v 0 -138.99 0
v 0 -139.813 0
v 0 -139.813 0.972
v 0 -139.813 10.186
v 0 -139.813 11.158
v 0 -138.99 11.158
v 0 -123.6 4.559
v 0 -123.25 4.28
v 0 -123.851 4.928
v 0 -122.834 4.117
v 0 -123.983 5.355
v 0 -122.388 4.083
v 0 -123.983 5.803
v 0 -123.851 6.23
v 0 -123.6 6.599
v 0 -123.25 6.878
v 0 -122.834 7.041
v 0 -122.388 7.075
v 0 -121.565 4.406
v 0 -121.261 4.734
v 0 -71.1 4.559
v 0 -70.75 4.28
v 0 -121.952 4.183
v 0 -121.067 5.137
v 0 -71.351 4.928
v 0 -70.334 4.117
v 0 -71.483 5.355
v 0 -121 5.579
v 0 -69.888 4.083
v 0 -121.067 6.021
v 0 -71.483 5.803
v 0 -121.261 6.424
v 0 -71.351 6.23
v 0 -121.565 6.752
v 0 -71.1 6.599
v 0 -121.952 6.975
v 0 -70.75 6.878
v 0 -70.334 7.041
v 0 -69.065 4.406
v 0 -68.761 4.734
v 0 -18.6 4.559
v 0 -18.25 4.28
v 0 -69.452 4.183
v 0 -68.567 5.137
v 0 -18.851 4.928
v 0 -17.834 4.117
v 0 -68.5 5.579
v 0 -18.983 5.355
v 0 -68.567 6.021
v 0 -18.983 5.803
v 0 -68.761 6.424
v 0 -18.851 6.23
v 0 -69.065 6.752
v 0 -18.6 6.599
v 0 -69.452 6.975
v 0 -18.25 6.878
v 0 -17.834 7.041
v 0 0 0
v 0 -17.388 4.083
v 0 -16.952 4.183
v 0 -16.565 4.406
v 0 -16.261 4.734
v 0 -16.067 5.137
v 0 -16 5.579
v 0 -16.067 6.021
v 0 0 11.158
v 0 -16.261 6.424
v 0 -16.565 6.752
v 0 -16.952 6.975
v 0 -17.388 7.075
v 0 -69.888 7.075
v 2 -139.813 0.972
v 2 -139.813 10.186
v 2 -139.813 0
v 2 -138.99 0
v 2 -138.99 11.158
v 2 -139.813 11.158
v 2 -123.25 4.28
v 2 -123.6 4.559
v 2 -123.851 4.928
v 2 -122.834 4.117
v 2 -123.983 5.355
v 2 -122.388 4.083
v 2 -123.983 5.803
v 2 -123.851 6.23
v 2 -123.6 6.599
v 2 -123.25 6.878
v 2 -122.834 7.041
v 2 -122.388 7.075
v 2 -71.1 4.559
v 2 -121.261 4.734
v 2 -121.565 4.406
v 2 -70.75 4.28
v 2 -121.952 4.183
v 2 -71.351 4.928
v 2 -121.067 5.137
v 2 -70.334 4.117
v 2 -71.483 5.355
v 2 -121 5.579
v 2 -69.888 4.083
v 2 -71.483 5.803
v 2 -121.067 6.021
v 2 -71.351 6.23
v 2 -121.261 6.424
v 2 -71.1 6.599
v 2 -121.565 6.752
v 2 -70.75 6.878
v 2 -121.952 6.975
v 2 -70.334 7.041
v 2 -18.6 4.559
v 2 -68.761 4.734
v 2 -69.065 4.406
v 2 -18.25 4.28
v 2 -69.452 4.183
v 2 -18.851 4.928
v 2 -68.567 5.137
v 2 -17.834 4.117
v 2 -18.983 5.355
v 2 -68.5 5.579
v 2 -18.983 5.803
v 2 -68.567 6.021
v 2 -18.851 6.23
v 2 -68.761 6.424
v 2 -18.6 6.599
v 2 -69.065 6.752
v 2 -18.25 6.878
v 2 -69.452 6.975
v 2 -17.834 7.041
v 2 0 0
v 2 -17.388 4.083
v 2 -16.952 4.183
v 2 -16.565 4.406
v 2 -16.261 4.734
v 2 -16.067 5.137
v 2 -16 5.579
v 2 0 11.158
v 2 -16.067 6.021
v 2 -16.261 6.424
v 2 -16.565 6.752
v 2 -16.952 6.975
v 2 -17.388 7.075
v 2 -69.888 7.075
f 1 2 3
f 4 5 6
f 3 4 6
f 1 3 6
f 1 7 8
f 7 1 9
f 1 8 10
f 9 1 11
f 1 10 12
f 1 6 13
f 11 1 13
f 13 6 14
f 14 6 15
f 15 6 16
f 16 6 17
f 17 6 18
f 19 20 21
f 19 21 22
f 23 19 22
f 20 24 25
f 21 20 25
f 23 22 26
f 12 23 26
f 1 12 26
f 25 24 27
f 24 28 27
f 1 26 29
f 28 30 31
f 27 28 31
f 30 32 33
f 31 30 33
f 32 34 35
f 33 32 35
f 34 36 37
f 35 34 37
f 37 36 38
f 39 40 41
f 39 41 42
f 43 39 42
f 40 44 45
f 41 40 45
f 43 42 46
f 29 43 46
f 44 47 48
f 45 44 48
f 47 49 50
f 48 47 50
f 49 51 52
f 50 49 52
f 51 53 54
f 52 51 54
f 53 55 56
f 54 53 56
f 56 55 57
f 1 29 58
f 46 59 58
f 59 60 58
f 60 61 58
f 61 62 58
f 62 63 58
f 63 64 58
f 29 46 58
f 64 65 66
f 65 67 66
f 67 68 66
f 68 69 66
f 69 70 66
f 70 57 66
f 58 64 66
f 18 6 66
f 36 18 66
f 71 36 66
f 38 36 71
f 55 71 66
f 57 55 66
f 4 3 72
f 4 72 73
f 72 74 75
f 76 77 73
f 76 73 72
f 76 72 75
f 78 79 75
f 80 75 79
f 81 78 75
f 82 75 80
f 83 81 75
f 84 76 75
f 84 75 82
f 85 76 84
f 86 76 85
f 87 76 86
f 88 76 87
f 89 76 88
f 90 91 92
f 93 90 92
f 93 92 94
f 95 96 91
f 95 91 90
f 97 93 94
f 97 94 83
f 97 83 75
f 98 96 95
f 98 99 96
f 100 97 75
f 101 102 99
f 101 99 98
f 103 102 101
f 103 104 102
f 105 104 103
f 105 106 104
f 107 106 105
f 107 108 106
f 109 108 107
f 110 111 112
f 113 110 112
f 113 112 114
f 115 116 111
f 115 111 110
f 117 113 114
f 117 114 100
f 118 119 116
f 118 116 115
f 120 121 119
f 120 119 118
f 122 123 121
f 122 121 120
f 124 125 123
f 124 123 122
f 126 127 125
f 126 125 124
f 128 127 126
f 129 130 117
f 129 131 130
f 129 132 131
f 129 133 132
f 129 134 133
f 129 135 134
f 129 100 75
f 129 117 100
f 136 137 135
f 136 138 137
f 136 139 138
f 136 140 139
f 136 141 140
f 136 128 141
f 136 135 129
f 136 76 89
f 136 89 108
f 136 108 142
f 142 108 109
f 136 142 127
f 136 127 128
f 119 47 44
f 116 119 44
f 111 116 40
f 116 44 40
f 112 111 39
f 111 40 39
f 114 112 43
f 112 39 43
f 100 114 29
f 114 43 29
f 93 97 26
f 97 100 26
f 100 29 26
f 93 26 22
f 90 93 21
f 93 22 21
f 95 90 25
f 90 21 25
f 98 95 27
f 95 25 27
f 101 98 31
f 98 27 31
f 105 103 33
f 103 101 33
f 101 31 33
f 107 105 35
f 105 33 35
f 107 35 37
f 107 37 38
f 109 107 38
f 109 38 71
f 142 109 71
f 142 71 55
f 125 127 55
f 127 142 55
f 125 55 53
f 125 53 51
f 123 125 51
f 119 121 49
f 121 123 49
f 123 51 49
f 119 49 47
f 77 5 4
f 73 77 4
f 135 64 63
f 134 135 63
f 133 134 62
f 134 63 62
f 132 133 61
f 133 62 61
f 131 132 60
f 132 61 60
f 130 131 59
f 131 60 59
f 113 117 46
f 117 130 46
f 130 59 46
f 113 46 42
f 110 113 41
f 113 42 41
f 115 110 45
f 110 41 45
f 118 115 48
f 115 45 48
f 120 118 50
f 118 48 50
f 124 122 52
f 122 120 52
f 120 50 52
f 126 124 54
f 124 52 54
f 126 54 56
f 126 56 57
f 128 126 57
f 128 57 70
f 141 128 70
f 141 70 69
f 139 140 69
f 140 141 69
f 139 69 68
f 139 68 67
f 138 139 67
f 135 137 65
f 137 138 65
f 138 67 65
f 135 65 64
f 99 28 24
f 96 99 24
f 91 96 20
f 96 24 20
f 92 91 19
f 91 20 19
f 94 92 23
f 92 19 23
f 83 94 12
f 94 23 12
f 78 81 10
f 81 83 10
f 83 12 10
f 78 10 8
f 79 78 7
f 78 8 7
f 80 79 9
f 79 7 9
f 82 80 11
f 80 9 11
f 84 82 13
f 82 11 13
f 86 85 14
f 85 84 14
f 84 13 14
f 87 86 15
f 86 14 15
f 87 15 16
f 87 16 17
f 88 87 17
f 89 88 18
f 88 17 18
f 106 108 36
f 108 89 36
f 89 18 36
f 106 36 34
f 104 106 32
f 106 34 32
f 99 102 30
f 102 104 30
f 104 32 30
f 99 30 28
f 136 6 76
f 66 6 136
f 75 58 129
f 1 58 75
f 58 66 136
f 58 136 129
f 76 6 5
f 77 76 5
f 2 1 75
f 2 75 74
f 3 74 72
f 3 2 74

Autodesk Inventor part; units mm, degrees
ref_plane "YZ Plane" through (0, 0, 0) normal (1, 0, 0) x (0, 1, 0)
ref_plane "XZ Plane" through (0, 0, 0) normal (0, 1, 0) x (-1, 0, 0)
ref_plane "XY Plane" through (0, 0, 0) normal (0, 0, 1) x (1, 0, 0)
sketch "Sketch2" plane through (0, 0, 0) normal (1, 0, 0) x (0, 1, 0)
  line L0 (-138.9896, 11.158) -> (0, 11.158)
  line L1 (-139.8126, 0.9719) -> (-139.8126, 10.1861)
  line L2 (0, 0) -> (-138.9896, 0)
  line L3 (0, 11.158) -> (0, 0)
  circle A0 centre (-122.5, 5.579) radius 1.5
  circle A1 centre (-70, 5.579) radius 1.5
  circle A2 centre (-17.5, 5.579) radius 1.5
  line L4 (-138.9896, 0) -> (-139.8126, 0)
  line L5 (-139.8126, 0) -> (-139.8126, 0.9719)
  line L6 (-138.9896, 11.158) -> (-139.8126, 11.158)
  line L7 (-139.8126, 11.158) -> (-139.8126, 10.1861)
extrude "Extrusion2" add sketch "Sketch2" along normal blind 2
properties part number "tutup_fin_fix"
